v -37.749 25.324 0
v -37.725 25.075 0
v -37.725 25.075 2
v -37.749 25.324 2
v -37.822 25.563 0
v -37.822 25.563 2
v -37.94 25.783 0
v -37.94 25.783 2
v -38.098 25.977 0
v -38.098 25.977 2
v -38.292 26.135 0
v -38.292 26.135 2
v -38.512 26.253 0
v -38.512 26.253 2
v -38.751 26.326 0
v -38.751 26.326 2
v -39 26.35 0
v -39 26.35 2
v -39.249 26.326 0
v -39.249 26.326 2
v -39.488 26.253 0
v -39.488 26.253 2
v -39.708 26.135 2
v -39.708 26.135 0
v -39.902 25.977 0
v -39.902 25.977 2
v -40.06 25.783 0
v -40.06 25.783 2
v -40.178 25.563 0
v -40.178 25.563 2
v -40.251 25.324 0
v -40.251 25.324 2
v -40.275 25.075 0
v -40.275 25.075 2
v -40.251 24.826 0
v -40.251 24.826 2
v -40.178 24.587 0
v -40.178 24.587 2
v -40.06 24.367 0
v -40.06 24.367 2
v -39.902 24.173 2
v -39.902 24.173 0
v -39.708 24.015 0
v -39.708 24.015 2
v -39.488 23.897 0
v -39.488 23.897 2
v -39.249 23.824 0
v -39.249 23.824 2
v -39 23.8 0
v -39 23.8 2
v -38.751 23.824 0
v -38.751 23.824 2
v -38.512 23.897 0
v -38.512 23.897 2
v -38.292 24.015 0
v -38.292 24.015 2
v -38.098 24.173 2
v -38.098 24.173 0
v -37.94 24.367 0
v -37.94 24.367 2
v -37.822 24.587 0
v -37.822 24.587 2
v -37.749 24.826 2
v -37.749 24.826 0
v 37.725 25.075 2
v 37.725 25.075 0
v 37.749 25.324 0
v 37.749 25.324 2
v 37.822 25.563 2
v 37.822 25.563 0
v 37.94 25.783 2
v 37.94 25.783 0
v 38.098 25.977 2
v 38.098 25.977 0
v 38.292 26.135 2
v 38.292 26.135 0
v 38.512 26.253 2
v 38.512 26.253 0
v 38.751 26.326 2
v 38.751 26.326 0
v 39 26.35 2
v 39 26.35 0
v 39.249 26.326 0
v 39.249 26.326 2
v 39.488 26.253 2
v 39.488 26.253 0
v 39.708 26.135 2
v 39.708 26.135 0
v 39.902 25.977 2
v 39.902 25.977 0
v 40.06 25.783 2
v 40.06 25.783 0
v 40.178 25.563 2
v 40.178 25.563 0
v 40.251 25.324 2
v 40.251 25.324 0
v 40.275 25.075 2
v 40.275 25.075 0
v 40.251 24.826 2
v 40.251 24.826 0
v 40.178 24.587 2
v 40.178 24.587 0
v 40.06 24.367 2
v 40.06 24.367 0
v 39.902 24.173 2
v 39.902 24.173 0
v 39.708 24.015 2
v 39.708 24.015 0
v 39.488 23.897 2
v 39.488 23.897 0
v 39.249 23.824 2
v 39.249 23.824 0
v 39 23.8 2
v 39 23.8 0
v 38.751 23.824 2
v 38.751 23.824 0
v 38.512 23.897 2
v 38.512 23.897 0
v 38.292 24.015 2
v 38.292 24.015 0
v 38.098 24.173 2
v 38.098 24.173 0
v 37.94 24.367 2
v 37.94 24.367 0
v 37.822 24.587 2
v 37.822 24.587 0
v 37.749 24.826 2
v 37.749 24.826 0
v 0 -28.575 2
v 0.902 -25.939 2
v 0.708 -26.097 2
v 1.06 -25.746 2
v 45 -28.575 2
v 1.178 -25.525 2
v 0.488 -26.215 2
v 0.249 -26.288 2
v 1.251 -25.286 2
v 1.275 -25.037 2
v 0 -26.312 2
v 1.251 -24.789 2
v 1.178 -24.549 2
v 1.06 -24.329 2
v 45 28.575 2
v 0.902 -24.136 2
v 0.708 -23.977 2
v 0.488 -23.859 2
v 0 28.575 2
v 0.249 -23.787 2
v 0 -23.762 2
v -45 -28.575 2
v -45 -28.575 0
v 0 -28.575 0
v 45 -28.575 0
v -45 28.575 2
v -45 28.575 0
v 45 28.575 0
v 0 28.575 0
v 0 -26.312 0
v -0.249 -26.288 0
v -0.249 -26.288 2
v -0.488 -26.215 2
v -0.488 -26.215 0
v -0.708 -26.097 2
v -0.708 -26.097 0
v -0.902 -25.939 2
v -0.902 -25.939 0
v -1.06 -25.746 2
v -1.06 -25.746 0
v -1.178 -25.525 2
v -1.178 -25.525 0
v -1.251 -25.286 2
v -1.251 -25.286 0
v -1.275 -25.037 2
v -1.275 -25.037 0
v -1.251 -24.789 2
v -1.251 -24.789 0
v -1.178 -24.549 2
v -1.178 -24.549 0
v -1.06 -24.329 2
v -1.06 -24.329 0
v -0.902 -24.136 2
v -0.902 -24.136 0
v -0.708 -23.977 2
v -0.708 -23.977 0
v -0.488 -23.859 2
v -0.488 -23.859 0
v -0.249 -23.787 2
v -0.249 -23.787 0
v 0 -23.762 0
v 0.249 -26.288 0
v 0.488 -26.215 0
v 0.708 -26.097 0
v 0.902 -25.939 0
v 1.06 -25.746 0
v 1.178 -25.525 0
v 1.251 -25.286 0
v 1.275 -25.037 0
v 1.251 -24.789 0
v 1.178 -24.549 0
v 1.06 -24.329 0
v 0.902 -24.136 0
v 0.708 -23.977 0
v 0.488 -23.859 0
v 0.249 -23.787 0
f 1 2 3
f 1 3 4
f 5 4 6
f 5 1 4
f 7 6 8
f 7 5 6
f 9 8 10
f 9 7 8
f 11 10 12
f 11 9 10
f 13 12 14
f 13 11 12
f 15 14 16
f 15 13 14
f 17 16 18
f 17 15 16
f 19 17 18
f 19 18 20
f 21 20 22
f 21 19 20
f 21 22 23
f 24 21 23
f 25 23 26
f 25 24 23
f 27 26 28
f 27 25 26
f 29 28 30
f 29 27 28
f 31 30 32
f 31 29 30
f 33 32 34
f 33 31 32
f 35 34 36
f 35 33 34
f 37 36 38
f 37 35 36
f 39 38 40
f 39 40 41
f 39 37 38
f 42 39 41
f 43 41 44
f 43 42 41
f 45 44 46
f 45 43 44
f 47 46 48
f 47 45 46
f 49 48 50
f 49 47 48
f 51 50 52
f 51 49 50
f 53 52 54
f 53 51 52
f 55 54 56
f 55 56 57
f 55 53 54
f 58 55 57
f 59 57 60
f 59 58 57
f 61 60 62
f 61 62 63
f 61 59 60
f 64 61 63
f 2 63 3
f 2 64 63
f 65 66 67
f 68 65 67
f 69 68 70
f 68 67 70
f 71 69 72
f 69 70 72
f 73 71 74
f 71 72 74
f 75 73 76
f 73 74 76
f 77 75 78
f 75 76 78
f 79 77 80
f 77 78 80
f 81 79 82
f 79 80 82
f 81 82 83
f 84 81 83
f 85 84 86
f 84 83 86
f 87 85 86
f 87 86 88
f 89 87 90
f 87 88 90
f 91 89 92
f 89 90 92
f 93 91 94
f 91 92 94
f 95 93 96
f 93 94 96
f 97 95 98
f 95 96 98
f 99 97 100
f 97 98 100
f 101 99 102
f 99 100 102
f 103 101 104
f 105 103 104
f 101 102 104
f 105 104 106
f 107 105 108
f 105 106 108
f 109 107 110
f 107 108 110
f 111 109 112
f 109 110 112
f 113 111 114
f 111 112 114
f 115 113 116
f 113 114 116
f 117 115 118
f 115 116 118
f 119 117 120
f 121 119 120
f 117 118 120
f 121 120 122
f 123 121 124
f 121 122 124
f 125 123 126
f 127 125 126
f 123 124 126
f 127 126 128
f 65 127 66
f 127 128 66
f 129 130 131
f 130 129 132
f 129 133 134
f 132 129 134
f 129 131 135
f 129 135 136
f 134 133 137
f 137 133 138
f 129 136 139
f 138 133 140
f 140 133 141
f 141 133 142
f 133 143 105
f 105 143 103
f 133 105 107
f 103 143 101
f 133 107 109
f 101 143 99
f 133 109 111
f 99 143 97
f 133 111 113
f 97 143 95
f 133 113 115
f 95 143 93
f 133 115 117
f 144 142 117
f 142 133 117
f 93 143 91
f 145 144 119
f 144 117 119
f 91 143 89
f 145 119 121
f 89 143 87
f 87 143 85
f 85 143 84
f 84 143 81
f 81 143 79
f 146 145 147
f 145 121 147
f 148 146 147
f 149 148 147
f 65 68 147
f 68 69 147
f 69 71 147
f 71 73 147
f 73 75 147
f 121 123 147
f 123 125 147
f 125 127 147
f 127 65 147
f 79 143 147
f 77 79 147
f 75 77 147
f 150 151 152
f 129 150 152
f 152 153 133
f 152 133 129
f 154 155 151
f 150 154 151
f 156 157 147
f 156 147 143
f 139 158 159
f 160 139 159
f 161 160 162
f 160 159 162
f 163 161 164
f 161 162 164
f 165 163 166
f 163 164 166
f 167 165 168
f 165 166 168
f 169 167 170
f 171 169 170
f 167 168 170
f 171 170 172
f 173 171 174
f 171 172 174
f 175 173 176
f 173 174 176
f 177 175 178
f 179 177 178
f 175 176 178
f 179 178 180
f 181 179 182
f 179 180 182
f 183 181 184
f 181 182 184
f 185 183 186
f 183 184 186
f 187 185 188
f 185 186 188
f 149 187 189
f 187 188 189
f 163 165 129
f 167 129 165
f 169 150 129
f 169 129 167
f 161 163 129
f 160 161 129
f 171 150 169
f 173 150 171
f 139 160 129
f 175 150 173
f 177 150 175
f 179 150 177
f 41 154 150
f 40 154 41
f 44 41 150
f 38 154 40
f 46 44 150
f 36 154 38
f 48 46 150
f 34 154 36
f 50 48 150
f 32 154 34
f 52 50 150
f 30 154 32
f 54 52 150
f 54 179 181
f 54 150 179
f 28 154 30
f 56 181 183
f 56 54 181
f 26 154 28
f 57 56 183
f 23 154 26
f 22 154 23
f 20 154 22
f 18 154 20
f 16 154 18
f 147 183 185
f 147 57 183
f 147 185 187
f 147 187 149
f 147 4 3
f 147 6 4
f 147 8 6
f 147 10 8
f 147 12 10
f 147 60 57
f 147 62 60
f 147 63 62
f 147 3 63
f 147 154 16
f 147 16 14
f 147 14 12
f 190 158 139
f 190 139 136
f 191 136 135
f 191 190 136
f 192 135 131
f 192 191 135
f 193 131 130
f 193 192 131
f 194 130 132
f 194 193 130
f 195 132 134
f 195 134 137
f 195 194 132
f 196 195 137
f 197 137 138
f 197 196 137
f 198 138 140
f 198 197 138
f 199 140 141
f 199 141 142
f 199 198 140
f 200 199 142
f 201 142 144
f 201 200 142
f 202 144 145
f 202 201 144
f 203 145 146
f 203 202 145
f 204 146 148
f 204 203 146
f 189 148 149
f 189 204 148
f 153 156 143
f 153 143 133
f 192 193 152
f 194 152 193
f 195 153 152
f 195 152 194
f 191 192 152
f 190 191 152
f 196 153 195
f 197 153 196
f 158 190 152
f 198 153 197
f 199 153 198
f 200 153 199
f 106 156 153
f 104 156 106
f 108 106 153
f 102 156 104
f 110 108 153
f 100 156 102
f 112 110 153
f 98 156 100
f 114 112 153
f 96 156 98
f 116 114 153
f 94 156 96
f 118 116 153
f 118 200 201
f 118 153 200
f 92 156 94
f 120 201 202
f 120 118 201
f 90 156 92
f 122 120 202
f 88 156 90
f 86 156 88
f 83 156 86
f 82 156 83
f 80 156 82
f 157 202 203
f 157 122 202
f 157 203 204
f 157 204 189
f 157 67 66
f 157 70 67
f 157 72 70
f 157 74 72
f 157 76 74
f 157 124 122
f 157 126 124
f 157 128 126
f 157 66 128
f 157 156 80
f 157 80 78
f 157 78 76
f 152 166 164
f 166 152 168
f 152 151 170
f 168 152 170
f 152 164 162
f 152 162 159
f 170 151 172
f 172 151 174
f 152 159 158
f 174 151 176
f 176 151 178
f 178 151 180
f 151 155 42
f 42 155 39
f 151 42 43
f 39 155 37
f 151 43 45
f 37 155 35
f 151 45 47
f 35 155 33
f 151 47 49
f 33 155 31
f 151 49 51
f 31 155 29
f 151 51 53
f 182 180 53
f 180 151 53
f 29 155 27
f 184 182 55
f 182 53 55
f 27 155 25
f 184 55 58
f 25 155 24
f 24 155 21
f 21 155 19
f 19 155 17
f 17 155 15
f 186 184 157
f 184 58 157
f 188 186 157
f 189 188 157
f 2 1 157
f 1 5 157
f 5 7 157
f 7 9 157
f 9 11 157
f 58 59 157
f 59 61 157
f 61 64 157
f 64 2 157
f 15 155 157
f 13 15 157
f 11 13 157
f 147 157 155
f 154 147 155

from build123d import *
from build123d import SkipClean  # not in build123d's __all__

# Parameters (mm, degrees)
F0_R     = 2.775
F0_R_2   = 1.275
F1_DEPTH = 2


with BuildPart() as f1:
    # F0 (on Top) → F1 (new body)
    with BuildSketch(Plane.XY):
        with BuildLine():
            Line((0, 28.575), (-45, 28.575))
            Line((-45, 28.575), (-45, -28.575))
            Line((-45, -28.575), (0, -28.575))
            Line((0, -28.575), (0, -27.8123737215))
            ThreePointArc((0, -27.8123737215), (-2.775, -25.0373737215), (0, -22.2623737215))
            Line((0, -22.2623737215), (0, 28.575))
        make_face()
        with Locations((-39, 25.075)):
            Circle(F0_R, mode=Mode.SUBTRACT)
        with BuildLine():
            Line((0, -23.7623737215), (0, -22.2623737215))
            ThreePointArc((0, -22.2623737215), (-2.775, -25.0373737215), (0, -27.8123737215))
            Line((0, -27.8123737215), (0, -26.3123737215))
            ThreePointArc((0, -26.3123737215), (-1.275, -25.0373737215), (0, -23.7623737215))
        make_face()
        with Locations((-39, 25.075)):
            Circle(F0_R)
        with Locations((-39, 25.075)):
            Circle(F0_R_2, mode=Mode.SUBTRACT)
    extrude(amount=F1_DEPTH)

    # F2: F1 across face


with BuildPart() as f1_1:
    add(f1.part, clean=False)
    with SkipClean():  # cleaning this boolean's faces spoils the solid; the shape is the same uncleaned
        add(f1.part.mirror(Plane(origin=(0, 2.4063131393, 1), x_dir=(0, 1, 0), z_dir=(1, 0, 0))), clean=False)


solid = f1_1.part
